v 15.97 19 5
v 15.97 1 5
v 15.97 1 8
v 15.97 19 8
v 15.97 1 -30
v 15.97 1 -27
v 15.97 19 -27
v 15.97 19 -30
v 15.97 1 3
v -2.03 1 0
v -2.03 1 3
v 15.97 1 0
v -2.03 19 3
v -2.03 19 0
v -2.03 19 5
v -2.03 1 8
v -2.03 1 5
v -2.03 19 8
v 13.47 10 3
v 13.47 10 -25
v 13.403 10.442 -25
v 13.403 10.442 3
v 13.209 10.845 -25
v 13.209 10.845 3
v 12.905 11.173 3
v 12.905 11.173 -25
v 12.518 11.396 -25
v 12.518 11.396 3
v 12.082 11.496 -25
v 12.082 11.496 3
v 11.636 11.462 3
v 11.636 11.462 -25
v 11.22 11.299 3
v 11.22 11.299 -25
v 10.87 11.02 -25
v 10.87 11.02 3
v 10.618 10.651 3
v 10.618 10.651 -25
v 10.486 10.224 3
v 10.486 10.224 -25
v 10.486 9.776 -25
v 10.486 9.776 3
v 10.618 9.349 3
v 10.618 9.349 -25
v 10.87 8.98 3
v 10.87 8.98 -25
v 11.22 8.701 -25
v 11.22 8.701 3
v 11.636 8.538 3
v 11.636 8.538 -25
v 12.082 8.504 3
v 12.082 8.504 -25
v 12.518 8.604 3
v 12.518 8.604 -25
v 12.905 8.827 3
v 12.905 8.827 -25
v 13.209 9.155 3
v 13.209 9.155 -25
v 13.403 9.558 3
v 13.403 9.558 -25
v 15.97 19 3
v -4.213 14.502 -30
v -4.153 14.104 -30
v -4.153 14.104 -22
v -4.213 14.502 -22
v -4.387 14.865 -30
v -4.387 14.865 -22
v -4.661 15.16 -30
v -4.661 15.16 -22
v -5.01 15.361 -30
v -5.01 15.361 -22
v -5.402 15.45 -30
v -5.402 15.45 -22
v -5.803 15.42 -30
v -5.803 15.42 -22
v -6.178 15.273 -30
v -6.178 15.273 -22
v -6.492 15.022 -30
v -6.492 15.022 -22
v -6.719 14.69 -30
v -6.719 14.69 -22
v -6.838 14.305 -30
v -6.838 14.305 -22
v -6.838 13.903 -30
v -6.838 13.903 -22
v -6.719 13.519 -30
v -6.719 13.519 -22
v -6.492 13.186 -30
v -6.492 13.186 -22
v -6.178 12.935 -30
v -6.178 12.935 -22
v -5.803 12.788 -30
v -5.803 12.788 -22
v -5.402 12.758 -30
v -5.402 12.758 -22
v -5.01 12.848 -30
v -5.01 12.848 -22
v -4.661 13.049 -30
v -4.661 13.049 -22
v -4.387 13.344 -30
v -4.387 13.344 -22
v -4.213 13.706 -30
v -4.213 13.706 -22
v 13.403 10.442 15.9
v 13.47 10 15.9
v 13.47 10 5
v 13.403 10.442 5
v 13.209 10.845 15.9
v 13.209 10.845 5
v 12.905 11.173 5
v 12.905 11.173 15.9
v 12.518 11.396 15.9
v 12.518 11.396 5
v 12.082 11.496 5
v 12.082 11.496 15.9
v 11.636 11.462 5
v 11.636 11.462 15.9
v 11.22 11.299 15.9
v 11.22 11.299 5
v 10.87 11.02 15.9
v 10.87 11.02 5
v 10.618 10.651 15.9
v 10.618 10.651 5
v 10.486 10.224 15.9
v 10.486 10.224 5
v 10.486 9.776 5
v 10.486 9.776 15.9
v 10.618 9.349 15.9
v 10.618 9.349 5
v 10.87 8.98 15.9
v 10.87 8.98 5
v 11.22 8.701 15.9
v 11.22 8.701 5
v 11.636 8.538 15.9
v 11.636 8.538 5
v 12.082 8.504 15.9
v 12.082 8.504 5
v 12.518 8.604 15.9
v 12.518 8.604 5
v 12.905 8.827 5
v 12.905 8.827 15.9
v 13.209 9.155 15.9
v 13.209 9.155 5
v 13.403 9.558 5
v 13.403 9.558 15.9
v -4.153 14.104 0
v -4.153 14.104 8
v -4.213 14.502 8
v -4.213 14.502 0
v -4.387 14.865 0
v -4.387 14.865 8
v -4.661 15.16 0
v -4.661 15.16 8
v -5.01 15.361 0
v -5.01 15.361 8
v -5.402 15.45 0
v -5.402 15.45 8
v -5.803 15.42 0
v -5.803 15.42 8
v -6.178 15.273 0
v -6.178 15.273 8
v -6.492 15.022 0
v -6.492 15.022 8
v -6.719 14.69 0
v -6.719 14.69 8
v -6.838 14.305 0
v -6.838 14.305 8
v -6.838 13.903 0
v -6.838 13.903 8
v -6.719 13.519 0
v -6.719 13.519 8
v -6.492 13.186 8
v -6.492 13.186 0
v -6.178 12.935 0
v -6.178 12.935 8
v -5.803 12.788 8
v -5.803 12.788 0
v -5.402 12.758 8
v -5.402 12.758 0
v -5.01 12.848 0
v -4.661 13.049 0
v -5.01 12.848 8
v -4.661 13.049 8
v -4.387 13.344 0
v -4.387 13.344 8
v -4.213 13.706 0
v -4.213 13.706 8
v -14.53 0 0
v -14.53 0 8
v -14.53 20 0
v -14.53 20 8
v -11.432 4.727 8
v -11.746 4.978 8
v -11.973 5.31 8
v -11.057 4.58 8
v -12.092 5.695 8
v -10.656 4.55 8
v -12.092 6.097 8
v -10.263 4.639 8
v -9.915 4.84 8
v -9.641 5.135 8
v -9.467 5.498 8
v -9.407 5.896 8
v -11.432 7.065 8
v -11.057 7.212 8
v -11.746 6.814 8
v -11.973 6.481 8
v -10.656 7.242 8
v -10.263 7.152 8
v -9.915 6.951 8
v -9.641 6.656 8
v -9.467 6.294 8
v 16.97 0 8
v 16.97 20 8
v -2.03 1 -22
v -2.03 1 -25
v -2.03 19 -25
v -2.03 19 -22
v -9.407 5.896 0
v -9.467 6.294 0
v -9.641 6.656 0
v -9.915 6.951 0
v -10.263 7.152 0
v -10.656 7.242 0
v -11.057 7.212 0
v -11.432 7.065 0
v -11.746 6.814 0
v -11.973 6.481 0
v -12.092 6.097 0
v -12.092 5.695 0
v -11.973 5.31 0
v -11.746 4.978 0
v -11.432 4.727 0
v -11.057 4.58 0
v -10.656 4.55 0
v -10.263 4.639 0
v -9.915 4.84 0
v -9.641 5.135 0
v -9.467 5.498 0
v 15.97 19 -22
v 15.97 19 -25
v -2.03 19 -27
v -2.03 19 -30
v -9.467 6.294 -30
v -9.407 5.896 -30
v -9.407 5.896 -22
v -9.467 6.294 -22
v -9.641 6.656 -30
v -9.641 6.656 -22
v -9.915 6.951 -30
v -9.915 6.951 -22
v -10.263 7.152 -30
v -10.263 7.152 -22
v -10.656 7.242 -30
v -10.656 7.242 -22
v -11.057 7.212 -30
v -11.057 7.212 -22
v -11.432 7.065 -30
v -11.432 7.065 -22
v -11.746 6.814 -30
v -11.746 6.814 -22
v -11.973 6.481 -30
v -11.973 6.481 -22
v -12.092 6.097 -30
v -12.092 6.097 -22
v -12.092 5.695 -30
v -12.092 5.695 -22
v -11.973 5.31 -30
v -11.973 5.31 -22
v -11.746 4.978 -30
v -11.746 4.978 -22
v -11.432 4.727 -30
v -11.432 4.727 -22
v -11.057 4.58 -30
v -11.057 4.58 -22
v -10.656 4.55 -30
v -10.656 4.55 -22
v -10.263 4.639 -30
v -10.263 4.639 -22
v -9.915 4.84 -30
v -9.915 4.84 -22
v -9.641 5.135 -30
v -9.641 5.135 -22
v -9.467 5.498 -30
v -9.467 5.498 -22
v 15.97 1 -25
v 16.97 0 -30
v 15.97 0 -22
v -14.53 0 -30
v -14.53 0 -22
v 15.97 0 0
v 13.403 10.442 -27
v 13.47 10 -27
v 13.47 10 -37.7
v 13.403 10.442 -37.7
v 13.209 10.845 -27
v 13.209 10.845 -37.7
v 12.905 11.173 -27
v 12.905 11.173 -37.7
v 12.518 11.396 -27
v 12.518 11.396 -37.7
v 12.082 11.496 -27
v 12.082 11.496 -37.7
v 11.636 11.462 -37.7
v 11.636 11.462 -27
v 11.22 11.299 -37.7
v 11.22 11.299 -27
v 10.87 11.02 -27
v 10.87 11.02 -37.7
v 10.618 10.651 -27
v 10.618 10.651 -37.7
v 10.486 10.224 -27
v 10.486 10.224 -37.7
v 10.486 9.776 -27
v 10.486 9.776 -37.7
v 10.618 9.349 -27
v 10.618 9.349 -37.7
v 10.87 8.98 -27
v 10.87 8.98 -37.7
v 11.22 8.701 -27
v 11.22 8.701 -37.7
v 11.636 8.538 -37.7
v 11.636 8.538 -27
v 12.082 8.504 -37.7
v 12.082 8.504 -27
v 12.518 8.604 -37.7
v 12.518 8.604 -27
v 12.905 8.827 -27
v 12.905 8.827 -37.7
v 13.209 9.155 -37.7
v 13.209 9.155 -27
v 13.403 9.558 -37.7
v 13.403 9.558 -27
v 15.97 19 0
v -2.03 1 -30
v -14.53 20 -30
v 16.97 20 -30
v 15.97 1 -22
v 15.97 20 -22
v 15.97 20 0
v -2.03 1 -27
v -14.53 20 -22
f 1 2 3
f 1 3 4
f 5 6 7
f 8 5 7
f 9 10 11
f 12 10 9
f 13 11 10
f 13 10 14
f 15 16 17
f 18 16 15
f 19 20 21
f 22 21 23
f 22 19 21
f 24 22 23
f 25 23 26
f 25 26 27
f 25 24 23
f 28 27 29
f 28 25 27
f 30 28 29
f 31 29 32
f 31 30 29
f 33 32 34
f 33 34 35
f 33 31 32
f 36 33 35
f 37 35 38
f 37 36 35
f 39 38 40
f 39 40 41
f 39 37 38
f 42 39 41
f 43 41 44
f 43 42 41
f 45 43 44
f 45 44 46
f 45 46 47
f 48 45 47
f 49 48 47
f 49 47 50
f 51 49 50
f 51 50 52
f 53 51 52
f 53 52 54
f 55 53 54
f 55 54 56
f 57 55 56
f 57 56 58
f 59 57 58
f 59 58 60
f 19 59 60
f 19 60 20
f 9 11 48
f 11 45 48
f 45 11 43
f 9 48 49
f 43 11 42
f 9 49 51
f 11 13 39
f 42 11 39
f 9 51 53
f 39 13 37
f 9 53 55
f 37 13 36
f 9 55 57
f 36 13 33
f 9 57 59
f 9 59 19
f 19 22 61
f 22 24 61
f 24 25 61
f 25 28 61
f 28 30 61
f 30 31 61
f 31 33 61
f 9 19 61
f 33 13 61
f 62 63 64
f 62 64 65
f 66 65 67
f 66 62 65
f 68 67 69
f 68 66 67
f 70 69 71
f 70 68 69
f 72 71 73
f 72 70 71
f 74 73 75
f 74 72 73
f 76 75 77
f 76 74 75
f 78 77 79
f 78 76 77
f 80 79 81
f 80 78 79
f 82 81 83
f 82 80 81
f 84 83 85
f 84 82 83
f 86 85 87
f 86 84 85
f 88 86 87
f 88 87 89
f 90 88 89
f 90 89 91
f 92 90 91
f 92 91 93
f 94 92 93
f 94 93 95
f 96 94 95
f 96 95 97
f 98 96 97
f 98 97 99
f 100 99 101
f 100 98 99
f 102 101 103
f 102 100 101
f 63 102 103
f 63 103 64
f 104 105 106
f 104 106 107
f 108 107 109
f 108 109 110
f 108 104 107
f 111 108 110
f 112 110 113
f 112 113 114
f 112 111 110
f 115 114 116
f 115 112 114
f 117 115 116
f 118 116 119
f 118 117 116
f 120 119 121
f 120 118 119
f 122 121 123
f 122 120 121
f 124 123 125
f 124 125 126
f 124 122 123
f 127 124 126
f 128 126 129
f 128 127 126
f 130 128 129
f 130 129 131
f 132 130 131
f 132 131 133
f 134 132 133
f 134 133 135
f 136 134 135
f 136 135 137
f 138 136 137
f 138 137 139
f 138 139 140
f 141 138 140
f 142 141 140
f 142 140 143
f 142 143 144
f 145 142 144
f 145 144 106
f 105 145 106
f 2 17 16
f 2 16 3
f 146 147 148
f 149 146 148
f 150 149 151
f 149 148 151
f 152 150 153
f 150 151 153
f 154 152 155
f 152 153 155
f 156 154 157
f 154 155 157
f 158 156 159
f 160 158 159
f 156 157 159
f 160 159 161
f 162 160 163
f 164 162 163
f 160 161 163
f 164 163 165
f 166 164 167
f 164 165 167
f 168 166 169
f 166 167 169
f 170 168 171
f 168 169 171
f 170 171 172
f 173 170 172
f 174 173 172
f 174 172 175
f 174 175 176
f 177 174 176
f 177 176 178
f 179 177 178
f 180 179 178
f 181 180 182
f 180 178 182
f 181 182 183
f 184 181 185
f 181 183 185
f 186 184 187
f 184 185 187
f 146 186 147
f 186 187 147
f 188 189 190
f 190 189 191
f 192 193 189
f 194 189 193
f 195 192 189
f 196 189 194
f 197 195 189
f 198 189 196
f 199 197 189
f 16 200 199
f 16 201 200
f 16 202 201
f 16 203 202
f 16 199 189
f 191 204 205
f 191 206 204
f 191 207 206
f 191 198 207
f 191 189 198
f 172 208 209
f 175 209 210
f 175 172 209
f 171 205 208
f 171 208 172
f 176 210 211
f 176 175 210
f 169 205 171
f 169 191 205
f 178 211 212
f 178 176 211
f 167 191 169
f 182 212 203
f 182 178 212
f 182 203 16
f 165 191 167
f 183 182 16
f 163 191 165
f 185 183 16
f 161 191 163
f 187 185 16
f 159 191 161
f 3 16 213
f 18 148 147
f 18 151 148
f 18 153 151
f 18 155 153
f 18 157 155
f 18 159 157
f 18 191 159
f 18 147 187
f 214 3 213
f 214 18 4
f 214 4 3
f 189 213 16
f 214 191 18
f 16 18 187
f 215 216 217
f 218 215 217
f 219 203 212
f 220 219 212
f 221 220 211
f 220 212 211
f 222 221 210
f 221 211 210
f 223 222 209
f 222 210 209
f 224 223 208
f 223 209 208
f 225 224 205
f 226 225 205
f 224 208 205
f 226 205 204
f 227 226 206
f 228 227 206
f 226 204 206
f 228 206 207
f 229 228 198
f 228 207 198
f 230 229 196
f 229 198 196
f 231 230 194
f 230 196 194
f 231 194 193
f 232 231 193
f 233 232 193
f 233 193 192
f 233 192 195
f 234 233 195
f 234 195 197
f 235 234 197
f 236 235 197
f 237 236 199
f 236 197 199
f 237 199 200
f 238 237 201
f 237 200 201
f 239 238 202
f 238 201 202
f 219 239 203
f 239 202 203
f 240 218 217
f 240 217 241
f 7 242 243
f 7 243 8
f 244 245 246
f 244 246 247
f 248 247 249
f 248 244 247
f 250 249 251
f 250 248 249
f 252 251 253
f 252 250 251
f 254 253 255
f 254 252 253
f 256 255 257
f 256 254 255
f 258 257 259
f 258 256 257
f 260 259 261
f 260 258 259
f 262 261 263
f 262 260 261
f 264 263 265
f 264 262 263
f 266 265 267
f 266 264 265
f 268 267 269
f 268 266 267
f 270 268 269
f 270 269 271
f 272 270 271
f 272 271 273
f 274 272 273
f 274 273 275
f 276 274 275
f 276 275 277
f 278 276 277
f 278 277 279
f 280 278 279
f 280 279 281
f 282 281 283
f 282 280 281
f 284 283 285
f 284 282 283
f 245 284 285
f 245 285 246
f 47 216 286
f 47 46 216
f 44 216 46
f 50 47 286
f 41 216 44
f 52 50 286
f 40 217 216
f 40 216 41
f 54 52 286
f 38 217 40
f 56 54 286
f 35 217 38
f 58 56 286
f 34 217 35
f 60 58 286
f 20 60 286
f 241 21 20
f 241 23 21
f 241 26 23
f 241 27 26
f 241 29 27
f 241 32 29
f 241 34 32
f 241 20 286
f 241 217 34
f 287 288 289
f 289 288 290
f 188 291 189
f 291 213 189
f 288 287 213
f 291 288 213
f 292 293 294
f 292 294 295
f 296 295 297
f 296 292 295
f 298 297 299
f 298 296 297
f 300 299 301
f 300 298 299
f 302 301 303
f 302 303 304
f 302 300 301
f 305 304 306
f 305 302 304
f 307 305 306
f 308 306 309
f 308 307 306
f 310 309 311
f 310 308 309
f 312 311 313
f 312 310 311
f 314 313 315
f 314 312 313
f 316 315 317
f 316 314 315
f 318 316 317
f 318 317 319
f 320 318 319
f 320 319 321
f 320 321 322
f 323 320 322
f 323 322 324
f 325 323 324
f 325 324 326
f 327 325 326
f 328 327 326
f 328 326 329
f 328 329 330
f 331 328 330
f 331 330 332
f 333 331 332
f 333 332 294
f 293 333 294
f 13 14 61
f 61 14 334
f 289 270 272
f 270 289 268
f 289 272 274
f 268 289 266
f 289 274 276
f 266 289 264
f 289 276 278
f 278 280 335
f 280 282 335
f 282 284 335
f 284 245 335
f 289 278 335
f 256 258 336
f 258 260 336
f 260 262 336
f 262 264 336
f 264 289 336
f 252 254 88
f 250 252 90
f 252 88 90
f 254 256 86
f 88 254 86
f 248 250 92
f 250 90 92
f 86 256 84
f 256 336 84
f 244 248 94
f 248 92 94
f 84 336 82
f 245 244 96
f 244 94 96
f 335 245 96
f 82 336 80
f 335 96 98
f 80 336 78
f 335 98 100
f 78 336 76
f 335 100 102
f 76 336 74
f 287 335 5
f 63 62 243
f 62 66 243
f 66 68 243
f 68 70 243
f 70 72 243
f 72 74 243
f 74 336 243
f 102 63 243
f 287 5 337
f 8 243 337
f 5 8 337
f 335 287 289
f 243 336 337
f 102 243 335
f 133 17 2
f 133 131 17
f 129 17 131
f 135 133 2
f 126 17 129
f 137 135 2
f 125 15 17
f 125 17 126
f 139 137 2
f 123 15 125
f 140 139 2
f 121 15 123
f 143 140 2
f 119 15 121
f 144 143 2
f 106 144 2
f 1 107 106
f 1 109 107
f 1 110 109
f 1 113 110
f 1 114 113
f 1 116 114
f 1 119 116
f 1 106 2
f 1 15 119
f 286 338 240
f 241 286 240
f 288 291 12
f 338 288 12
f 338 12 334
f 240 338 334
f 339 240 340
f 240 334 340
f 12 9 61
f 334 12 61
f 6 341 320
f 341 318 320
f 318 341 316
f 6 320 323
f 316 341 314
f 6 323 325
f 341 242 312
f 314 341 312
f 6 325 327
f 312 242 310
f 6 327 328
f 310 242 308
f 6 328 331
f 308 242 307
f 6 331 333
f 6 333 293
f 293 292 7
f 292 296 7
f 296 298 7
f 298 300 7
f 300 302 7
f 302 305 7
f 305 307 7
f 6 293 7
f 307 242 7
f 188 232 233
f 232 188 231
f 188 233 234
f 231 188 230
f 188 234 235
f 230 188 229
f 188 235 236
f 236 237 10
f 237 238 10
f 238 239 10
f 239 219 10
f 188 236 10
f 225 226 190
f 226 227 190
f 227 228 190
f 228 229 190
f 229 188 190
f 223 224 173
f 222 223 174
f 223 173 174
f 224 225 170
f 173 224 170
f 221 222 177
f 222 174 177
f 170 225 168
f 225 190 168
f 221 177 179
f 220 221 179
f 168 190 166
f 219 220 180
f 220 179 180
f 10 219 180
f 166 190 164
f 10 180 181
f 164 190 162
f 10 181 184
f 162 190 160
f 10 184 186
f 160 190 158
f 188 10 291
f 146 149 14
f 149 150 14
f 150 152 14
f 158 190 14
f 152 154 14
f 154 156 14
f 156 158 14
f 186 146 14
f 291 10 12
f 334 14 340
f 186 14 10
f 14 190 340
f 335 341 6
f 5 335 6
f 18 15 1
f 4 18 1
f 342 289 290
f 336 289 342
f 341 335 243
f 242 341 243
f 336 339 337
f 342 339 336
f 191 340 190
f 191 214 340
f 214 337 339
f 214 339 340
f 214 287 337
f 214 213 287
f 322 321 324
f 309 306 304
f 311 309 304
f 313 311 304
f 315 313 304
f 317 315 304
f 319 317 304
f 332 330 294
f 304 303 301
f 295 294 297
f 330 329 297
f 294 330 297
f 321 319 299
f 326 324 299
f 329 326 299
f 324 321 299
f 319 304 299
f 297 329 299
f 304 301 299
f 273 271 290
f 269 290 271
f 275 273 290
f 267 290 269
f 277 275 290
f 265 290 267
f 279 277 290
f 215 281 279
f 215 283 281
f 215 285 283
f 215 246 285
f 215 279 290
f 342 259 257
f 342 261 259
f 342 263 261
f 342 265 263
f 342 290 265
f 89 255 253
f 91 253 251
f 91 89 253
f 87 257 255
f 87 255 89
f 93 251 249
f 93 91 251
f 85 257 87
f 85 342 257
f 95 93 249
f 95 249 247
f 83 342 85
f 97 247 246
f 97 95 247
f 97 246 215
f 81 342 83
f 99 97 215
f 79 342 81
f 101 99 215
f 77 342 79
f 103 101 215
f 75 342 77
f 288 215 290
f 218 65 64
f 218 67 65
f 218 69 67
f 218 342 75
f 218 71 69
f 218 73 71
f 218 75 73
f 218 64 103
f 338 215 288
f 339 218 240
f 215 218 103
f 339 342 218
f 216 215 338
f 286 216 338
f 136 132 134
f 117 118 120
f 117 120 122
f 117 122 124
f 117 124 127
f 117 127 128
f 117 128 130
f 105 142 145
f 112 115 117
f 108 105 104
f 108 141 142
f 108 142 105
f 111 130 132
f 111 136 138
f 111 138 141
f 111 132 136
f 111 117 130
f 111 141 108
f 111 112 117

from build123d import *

# Parameters (mm, degrees)
SKETCH1_W           = 31.5
SKETCH1_H           = 20
SKETCH1_W_2         = 29.5
SKETCH1_H_2         = 18
EXTRUDE_THIN1_DEPTH = 8
BOSS_EXTRUDE1_START = 4
SKETCH2_W           = 31.5
SKETCH2_H           = 20
BOSS_EXTRUDE1_DEPTH = 1
SKETCH4_W           = 12.5
SKETCH4_H           = 20
BOSS_EXTRUDE2_DEPTH = 8
SKETCH5_R           = 1.35
CUT_EXTRUDE2_DEPTH  = 8
SKETCH12_W          = 1
SKETCH12_H          = 20
BOSS_EXTRUDE4_DEPTH = 22
BOSS_EXTRUDE6_START = 10.9
SKETCH3_R           = 1.5
BOSS_EXTRUDE6_DEPTH = 53.6


with BuildPart() as part:
    # Sketch1 → Extrude-Thin1 (new body)
    with BuildSketch(Plane.XY):
        with Locations((1.21969697, 10)):
            Rectangle(SKETCH1_W, SKETCH1_H)
        with Locations((1.21969697, 10)):
            Rectangle(SKETCH1_W_2, SKETCH1_H_2, mode=Mode.SUBTRACT)
    extrude(amount=EXTRUDE_THIN1_DEPTH)

    # Sketch2 → Boss-Extrude1 (add, symmetric)
    with BuildSketch(Plane.XY.offset(BOSS_EXTRUDE1_START)):
        with Locations((1.21969697, 10)):
            Rectangle(SKETCH2_W, SKETCH2_H)
    extrude(amount=BOSS_EXTRUDE1_DEPTH, both=True)

    # Sketch4 → Boss-Extrude2 (add)
    with BuildSketch(Plane.XY.offset(8)):
        with Locations((-8.28030303, 10)):
            Rectangle(SKETCH4_W, SKETCH4_H)
    extrude(amount=-BOSS_EXTRUDE2_DEPTH)

    # Sketch5 → Cut-Extrude2 (cut)
    with BuildSketch(Plane.XY.offset(8)):
        with Locations((-10.756674766, 5.895738268)):
            Circle(SKETCH5_R)
        with Locations((-5.502724413, 14.104261732)):
            Circle(SKETCH5_R)
    extrude(amount=-CUT_EXTRUDE2_DEPTH, mode=Mode.SUBTRACT)

    # Sketch12 → Boss-Extrude4 (add)
    with BuildSketch(Plane(origin=(0, 0, 0), x_dir=(-1, 0, 0), z_dir=(0, 0, -1))):
        with Locations((-16.46969697, 10)):
            Rectangle(SKETCH12_W, SKETCH12_H)
    extrude(amount=BOSS_EXTRUDE4_DEPTH)

    # Mirror5: part across plane


with BuildPart() as part_1:
    add(part.part)
    add(part.part.mirror(Plane.XY.offset(-11)))

    # Sketch3 → Boss-Extrude6 (add)
    with BuildSketch(Plane.XY.offset(5).offset(BOSS_EXTRUDE6_START)):
        with Locations((11.96969697, 10)):
            Circle(SKETCH3_R)
    extrude(amount=-BOSS_EXTRUDE6_DEPTH)


solid = part_1.part
